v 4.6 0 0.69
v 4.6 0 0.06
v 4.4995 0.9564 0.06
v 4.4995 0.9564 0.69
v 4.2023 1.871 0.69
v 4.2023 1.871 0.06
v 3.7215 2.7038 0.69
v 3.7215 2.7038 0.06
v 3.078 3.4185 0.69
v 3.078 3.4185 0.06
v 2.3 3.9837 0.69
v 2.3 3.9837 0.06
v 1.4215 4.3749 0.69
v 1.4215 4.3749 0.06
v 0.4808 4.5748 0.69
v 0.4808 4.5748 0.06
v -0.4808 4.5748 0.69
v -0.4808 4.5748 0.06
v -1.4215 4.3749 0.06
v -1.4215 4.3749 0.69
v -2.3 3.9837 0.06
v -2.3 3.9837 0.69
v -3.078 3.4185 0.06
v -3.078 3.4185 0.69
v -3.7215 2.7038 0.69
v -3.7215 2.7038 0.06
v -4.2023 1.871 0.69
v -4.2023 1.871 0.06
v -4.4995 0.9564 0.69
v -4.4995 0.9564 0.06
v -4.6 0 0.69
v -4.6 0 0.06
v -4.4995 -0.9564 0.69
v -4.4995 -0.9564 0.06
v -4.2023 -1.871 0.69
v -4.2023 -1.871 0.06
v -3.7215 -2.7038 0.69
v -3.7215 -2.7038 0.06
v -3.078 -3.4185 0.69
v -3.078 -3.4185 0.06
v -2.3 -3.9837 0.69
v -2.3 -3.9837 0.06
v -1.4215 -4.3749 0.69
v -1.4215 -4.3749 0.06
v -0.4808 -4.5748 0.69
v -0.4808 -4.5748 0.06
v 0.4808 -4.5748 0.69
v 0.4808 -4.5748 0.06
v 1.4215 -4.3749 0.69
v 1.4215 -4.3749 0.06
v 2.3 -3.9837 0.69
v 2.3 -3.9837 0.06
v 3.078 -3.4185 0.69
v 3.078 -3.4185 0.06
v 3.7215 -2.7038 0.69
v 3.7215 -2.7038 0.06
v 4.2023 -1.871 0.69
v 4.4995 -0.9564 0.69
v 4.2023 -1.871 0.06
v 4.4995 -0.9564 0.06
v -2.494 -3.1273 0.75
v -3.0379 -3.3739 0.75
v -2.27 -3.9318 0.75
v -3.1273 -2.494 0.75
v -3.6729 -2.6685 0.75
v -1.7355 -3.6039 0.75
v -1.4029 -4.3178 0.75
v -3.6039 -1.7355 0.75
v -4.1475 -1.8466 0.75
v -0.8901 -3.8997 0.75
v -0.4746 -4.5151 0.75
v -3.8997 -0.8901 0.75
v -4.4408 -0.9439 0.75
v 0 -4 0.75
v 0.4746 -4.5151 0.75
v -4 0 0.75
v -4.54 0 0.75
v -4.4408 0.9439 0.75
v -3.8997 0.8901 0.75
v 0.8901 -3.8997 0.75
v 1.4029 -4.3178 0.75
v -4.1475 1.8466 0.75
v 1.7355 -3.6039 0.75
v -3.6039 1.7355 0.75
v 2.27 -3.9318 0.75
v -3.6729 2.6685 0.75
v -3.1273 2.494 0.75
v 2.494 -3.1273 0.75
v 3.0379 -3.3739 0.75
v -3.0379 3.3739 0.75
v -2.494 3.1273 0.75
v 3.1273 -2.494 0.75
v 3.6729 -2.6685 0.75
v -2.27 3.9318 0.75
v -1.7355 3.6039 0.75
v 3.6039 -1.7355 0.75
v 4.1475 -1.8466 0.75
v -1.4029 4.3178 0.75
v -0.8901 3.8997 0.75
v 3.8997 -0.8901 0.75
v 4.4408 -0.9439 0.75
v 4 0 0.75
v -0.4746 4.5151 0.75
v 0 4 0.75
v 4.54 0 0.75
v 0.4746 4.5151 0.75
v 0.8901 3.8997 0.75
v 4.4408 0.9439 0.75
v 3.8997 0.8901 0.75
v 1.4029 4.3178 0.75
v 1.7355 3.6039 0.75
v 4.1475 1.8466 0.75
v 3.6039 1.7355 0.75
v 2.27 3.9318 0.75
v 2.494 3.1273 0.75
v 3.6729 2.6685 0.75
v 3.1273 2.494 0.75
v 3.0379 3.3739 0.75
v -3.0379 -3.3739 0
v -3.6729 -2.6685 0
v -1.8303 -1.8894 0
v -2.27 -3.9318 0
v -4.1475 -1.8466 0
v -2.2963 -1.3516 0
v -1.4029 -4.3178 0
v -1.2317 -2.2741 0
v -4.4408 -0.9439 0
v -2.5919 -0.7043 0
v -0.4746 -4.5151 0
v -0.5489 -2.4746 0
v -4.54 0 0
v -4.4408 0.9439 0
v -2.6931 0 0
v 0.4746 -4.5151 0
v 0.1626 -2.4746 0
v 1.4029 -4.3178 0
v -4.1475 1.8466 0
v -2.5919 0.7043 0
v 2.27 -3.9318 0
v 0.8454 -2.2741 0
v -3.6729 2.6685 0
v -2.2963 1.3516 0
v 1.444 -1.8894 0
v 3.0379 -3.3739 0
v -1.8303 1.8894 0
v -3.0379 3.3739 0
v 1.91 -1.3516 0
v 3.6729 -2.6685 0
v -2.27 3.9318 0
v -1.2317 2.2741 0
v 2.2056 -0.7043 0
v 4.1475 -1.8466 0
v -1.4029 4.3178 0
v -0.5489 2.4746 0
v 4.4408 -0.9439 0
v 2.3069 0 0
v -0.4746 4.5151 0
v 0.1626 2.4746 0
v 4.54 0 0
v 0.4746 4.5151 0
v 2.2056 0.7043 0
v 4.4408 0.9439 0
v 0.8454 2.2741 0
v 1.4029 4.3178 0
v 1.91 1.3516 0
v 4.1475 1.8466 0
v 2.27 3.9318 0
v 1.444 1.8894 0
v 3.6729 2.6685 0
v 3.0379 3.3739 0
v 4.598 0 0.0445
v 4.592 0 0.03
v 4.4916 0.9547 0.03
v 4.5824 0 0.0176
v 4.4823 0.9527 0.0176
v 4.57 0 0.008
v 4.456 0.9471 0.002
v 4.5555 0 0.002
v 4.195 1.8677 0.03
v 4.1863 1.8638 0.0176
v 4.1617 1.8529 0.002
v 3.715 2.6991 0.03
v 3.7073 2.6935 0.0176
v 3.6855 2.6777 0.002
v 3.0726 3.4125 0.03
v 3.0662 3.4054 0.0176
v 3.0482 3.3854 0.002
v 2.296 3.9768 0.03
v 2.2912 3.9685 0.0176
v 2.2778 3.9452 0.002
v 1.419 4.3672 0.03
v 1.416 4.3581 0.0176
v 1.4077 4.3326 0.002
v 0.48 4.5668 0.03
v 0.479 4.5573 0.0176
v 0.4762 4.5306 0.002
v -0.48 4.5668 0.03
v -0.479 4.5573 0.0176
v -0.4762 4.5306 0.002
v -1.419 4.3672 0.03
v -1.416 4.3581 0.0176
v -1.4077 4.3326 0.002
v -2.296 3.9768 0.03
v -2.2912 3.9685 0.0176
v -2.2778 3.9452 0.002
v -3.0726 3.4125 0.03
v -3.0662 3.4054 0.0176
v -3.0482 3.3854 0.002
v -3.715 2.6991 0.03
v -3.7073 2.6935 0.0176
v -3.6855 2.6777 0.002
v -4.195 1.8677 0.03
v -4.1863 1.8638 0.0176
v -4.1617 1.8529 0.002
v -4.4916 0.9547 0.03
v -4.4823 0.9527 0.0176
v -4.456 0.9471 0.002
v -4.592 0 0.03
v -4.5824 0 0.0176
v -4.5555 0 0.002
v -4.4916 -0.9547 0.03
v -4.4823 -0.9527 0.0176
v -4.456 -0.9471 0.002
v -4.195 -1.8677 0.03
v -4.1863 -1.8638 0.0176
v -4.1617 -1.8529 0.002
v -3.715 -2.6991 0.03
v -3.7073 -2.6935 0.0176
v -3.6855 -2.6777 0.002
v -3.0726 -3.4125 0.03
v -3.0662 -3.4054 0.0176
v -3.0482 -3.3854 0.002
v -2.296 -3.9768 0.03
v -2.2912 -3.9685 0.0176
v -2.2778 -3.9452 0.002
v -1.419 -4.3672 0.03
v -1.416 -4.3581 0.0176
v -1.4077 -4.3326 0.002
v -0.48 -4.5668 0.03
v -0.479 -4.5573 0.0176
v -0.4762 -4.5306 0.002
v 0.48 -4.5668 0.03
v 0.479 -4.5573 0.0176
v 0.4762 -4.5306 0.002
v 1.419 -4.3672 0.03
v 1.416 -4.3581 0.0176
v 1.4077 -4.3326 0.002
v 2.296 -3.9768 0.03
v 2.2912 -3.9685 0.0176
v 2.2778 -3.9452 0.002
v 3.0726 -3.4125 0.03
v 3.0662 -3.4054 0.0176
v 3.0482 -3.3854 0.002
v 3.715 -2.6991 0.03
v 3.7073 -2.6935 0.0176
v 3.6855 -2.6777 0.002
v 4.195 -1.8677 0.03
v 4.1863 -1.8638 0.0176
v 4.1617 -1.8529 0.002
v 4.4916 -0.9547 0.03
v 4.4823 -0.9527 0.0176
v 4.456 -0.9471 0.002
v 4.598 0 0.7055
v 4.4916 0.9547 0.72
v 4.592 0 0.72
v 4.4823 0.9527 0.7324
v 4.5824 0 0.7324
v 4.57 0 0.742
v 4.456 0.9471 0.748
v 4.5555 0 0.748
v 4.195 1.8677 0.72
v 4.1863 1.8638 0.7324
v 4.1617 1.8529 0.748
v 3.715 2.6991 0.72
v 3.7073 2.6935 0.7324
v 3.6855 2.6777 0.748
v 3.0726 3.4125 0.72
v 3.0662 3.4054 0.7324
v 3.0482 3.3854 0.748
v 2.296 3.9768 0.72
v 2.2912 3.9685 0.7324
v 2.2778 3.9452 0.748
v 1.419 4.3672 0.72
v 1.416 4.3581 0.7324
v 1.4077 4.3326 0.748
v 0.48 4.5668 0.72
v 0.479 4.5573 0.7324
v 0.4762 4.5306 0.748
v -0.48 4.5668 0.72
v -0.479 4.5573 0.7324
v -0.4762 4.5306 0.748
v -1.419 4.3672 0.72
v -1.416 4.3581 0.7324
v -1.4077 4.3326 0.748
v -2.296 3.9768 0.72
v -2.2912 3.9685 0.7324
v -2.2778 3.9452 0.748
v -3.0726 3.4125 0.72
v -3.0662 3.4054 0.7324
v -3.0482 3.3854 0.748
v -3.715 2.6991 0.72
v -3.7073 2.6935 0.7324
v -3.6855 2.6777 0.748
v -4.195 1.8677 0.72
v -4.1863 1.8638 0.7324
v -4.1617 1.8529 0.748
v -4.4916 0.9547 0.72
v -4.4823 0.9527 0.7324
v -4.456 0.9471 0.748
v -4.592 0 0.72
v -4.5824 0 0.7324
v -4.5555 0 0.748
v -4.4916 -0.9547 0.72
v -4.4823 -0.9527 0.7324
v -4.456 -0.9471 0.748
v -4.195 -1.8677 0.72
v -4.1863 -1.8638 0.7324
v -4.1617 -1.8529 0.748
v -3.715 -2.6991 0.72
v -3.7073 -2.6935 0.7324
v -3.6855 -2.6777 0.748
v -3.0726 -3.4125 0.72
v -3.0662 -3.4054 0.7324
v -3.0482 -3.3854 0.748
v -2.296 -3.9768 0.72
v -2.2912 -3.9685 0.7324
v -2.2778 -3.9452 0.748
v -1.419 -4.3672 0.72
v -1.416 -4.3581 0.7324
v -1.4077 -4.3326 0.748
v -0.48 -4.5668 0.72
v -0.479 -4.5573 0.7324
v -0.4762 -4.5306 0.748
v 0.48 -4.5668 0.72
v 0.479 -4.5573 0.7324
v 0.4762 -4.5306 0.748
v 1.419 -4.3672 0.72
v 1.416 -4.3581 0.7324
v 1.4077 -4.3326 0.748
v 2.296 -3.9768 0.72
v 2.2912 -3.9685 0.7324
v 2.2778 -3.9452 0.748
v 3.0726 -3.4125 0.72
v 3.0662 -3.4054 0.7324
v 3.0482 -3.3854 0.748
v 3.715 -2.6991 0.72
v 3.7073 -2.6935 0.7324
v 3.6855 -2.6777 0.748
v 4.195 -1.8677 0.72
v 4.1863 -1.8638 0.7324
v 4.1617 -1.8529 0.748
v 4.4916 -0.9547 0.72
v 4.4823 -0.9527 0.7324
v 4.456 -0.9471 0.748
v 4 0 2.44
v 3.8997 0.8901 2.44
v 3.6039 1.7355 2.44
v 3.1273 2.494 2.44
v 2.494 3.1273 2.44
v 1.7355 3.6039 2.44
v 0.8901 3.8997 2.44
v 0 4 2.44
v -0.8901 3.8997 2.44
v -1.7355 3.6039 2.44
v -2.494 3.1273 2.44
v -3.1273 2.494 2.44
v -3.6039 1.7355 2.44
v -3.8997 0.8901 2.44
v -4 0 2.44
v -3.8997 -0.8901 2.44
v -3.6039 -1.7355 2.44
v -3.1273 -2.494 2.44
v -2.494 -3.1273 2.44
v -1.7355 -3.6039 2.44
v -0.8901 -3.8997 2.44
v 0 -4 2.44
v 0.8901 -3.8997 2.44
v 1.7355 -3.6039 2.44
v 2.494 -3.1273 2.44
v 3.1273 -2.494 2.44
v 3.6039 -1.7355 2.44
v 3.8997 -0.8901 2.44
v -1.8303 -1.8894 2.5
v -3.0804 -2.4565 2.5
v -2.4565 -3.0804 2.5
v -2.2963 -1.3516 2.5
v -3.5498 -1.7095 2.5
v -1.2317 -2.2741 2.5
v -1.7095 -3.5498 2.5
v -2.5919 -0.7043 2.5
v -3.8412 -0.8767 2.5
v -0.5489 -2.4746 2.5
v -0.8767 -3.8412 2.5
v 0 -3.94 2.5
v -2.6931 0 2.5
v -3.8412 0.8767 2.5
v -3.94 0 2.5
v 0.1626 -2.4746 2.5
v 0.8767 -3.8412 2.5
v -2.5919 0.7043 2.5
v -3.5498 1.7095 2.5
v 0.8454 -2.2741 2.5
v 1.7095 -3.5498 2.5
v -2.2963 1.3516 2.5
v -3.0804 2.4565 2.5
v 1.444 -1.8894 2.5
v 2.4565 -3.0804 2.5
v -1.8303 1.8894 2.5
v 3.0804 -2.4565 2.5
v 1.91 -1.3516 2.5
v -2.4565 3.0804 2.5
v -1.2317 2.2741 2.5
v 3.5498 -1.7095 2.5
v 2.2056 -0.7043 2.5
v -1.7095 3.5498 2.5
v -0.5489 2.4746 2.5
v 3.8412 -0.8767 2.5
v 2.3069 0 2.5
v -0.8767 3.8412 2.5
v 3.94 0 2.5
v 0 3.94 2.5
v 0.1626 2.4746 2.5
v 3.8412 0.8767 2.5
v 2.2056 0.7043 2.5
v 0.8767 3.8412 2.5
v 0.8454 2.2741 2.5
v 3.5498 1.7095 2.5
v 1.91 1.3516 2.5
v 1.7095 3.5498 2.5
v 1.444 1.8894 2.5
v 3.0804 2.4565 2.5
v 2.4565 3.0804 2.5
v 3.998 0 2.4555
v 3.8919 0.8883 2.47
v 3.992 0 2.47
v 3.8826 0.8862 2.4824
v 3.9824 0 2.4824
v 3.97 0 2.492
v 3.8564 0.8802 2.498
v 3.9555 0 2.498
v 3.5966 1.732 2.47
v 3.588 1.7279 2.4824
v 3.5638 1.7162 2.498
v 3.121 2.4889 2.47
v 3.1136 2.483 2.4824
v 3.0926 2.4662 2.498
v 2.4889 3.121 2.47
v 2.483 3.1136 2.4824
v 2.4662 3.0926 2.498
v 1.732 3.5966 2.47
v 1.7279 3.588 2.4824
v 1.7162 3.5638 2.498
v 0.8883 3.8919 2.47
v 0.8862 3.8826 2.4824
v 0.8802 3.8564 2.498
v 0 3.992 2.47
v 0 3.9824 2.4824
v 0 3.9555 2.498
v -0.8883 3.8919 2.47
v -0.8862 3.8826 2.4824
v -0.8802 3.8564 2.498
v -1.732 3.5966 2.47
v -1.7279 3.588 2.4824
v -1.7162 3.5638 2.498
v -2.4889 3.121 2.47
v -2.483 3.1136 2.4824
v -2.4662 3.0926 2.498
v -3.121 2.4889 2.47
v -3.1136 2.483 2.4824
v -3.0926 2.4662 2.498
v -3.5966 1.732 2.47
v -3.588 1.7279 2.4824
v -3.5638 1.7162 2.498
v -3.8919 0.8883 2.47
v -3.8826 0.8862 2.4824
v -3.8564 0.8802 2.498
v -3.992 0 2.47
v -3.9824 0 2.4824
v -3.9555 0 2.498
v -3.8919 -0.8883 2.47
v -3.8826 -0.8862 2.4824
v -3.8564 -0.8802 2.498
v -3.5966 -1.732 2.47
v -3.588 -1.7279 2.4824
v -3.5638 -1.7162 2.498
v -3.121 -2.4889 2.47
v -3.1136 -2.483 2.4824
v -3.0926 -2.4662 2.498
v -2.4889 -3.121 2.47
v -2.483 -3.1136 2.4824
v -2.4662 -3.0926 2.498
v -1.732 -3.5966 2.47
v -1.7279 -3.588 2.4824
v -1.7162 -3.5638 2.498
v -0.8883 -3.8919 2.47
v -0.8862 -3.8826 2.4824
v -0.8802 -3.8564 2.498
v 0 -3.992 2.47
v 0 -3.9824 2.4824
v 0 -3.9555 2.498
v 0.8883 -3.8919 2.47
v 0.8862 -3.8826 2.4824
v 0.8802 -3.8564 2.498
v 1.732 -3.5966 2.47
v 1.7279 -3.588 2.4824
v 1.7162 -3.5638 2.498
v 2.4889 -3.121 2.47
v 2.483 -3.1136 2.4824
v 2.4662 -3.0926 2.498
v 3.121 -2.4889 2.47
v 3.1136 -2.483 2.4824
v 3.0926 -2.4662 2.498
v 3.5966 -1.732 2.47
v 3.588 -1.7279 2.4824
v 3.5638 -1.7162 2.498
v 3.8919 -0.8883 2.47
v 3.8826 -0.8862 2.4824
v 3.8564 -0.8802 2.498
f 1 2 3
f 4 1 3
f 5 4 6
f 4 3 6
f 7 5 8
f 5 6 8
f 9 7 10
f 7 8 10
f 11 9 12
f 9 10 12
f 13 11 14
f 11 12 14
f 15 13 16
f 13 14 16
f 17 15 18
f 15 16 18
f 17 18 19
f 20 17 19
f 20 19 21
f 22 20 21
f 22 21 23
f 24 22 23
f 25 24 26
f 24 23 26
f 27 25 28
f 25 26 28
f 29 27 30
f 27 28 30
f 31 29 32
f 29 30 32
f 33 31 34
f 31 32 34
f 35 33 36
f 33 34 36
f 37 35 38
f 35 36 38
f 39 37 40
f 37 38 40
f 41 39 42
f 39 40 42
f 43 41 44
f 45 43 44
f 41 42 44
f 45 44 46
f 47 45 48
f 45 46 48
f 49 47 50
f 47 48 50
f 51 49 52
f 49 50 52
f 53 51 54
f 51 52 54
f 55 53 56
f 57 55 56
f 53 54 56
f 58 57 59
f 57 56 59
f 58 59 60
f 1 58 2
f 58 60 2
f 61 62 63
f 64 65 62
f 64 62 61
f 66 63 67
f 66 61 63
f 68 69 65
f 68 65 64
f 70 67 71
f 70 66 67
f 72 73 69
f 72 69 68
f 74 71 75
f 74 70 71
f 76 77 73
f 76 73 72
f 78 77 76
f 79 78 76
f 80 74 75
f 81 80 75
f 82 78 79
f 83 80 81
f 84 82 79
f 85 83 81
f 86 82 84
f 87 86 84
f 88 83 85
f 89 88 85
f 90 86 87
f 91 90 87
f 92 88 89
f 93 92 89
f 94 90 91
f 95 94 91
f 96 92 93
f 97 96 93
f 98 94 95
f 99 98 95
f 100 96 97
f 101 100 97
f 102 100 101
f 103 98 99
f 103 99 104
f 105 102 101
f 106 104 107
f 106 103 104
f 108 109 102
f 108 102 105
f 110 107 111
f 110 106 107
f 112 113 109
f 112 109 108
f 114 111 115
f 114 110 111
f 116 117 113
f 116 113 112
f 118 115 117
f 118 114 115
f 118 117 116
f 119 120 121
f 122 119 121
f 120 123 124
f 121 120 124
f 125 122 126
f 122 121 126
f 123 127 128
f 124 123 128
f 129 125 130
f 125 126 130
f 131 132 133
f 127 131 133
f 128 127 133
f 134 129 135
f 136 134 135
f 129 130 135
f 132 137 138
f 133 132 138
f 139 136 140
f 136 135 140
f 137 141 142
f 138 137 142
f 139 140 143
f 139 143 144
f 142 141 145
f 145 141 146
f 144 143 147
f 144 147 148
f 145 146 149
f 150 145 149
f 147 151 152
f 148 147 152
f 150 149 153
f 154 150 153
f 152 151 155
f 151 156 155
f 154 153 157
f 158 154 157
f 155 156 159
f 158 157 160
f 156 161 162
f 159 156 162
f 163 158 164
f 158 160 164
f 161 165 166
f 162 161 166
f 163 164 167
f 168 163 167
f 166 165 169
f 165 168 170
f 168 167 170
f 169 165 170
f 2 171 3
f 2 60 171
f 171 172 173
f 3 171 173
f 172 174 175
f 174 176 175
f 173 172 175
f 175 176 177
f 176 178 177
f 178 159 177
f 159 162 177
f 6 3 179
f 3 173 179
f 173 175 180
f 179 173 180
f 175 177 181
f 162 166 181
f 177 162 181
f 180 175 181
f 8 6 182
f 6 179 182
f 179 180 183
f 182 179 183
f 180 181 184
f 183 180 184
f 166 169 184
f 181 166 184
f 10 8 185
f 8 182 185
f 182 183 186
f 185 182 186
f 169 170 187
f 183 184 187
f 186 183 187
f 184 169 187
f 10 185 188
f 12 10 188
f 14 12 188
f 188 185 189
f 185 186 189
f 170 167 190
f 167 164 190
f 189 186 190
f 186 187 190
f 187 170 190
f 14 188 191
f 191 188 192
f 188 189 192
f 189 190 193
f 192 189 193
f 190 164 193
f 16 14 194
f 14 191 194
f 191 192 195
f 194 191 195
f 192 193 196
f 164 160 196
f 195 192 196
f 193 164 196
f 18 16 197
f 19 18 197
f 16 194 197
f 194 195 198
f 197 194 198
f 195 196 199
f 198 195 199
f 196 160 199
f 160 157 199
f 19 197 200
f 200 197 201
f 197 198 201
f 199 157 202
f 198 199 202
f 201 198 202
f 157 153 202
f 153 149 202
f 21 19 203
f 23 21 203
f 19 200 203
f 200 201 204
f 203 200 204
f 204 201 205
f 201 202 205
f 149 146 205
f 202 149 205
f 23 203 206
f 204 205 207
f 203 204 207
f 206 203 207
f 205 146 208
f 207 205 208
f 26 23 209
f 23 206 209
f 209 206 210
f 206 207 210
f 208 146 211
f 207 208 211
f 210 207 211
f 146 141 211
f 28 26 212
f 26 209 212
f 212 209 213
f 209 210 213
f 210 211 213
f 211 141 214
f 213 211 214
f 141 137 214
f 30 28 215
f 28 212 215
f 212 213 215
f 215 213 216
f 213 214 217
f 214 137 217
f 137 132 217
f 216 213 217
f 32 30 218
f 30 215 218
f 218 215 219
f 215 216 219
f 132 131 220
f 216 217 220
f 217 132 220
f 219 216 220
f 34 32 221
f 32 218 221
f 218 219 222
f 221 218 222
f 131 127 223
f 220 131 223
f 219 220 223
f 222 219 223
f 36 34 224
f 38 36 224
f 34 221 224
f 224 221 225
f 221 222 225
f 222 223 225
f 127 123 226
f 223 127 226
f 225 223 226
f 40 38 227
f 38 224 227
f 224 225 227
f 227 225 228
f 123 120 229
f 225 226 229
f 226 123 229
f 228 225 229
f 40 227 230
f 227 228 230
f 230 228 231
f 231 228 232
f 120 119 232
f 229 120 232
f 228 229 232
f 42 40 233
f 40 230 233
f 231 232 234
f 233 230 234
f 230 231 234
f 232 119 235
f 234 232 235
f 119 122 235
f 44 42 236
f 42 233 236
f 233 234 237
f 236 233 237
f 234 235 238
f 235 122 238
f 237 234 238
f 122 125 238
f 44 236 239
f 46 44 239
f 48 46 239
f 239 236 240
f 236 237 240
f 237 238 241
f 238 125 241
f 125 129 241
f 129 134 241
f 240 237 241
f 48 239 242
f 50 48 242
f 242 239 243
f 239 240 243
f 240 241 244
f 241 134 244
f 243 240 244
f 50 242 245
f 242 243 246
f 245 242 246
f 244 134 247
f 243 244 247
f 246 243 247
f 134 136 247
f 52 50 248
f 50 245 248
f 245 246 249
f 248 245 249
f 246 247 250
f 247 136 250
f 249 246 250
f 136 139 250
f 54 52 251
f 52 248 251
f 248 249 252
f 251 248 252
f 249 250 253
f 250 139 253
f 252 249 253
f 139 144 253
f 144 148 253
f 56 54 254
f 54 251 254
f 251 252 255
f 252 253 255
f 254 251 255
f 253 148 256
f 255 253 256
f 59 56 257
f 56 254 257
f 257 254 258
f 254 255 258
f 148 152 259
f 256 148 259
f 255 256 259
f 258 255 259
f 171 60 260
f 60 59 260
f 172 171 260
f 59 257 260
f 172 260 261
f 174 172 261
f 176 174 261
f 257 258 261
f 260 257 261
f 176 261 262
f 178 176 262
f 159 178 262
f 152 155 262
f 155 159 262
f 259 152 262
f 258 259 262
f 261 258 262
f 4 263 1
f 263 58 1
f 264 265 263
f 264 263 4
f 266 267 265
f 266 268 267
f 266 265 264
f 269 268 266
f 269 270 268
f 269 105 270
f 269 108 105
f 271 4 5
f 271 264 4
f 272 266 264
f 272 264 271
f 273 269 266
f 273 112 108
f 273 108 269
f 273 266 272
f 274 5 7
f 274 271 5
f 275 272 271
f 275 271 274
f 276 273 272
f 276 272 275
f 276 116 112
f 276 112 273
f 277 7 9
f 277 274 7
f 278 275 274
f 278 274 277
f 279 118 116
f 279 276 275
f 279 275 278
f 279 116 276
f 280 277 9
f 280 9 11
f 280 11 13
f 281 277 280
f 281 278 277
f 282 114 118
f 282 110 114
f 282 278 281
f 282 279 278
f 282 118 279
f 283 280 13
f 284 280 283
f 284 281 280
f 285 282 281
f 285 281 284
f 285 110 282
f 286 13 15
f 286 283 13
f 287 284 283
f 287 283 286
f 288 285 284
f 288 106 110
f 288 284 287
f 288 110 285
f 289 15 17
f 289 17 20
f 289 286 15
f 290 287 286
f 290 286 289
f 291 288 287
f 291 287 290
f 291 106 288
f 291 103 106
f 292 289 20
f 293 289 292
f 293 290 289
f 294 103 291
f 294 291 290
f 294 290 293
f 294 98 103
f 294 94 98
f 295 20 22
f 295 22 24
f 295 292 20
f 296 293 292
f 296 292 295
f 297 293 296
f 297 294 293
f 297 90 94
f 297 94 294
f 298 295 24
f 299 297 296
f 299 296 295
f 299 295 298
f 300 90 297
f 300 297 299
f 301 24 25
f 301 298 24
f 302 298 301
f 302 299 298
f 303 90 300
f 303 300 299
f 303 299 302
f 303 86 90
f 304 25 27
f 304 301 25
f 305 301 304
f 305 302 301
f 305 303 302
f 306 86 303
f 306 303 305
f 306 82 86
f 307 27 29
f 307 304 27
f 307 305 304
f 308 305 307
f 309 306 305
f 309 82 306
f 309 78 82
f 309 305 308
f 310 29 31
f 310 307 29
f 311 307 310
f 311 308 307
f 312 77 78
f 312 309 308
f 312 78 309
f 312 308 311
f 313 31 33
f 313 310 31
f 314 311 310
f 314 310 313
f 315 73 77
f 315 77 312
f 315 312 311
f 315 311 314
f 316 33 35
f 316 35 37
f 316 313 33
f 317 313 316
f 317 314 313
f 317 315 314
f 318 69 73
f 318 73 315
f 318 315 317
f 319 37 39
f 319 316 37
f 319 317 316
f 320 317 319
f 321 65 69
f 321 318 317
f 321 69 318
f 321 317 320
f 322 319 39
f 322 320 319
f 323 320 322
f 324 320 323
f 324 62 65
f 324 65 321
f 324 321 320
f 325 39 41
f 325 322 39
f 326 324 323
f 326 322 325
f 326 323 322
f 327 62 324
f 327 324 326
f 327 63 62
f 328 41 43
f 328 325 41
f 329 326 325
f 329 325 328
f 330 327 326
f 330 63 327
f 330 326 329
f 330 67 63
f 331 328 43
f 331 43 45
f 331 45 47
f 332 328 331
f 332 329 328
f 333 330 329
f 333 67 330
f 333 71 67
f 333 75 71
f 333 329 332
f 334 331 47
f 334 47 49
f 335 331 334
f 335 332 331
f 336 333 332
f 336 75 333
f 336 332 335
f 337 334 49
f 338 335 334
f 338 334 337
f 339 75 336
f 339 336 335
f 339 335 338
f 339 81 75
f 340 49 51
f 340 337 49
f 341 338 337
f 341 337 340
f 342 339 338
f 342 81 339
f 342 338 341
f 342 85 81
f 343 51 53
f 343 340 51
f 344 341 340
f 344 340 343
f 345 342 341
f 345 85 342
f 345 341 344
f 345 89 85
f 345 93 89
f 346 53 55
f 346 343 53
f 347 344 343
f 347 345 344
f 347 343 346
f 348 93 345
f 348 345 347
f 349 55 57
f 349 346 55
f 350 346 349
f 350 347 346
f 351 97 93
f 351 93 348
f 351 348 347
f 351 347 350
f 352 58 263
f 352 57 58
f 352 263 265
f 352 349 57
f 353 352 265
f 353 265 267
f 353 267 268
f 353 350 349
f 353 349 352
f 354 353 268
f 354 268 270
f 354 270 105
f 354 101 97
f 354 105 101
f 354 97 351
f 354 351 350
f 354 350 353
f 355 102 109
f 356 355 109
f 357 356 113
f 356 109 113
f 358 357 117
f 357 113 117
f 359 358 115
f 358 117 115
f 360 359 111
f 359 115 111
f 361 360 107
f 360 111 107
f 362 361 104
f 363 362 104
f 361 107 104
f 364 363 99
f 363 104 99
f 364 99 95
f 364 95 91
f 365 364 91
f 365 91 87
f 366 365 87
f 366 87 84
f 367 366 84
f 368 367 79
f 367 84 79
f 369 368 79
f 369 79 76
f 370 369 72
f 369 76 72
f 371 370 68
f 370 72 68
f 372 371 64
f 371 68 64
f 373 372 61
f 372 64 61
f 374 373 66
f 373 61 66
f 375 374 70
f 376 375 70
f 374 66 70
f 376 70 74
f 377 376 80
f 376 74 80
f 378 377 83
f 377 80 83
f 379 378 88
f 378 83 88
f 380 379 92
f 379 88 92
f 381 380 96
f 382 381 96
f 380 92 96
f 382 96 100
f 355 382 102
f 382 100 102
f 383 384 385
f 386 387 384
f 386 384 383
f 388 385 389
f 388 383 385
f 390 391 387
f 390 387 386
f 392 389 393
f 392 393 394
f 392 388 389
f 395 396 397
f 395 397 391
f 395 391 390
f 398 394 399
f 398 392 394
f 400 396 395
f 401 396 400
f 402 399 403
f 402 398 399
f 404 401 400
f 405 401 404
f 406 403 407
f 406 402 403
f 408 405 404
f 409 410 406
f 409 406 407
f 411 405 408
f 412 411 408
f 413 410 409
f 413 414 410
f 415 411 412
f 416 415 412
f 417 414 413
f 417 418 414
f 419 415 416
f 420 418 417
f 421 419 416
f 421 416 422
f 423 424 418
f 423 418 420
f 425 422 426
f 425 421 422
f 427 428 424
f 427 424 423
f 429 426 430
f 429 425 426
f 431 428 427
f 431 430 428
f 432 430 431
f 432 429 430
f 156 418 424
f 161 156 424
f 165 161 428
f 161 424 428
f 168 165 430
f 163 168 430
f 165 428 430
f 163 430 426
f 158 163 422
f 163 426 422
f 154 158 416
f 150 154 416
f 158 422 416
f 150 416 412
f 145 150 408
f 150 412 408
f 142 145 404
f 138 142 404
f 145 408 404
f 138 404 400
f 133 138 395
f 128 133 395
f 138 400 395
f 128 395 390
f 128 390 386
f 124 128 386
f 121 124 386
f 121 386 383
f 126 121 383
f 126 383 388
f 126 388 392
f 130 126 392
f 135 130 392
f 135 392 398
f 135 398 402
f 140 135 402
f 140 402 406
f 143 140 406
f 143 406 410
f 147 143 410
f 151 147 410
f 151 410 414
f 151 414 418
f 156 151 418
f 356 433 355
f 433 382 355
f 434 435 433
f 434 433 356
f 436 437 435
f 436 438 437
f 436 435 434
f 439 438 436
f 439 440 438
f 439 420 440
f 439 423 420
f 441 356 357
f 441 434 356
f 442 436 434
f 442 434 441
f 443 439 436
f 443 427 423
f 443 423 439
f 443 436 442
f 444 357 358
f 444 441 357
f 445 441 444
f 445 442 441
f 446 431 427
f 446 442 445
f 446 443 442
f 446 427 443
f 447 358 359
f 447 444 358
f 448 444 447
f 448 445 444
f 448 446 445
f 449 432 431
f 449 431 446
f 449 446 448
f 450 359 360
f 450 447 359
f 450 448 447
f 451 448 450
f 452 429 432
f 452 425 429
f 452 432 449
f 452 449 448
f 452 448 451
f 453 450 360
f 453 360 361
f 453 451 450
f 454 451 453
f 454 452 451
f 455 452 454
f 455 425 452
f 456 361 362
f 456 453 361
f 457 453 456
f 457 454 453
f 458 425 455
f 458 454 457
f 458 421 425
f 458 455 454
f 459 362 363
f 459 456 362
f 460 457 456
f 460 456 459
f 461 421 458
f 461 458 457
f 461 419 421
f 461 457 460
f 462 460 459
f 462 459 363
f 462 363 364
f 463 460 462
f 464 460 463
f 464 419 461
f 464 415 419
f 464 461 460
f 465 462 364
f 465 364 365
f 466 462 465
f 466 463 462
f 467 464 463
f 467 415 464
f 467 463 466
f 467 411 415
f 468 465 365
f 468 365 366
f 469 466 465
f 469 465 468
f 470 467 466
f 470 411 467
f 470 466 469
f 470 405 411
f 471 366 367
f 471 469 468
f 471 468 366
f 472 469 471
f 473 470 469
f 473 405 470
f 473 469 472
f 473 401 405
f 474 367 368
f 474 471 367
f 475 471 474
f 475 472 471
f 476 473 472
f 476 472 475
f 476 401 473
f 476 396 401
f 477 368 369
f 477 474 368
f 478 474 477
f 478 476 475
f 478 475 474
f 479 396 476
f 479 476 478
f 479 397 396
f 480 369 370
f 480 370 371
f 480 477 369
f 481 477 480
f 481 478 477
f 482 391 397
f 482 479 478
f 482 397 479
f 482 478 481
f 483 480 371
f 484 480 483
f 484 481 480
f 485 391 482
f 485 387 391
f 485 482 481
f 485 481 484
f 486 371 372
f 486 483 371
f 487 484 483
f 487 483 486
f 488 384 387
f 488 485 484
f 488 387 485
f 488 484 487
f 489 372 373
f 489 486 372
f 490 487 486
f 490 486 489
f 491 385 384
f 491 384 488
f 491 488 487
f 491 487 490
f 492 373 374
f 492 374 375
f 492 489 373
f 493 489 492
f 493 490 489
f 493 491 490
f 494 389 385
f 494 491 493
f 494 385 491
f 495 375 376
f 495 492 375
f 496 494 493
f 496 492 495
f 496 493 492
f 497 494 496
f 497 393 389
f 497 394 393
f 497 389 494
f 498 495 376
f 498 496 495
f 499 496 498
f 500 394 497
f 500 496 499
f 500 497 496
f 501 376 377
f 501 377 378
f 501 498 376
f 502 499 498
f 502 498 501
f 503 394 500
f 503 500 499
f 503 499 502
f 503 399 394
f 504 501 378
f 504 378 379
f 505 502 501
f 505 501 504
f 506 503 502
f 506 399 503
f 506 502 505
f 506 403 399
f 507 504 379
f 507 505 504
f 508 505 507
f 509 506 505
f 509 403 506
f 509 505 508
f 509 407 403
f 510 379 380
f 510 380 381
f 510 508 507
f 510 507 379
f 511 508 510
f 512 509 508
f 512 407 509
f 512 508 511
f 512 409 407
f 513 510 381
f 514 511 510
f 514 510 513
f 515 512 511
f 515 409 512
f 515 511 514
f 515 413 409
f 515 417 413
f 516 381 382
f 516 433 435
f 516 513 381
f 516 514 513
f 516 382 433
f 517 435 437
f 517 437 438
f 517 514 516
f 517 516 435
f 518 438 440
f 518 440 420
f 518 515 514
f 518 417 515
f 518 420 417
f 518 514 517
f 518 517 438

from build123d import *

# Parameters (mm, degrees)
SKETCH1_R           = 4.6
BOSS_EXTRUDE1_DEPTH = 0.75
SKETCH2_R           = 4
BOSS_EXTRUDE2_DEPTH = 1.75
SKETCH3_R           = 2.5
CUT_EXTRUDE1_DEPTH  = 3.5
FILLET1_R           = 0.06


with BuildPart() as part:
    # Sketch1 → Boss-Extrude1 (new body)
    with BuildSketch(Plane.XY):
        Circle(SKETCH1_R)
    extrude(amount=BOSS_EXTRUDE1_DEPTH)

    # Sketch2 → Boss-Extrude2 (add)
    with BuildSketch(Plane.XY.offset(0.75)):
        Circle(SKETCH2_R)
    extrude(amount=BOSS_EXTRUDE2_DEPTH)

    # Sketch3 → Cut-Extrude1 (cut, through all)
    with BuildSketch(Plane.XY.offset(2.5)):
        with Locations((-0.193142298, 0)):
            Circle(SKETCH3_R)
    extrude(amount=-CUT_EXTRUDE1_DEPTH, mode=Mode.SUBTRACT)

    # Fillet1
    fillet1_edges = [part.edges().sort_by_distance(p)[0] for p in [
        (-4.6, 0, 0),
        (-4.6, 0, 0.75),
        (-4, 0, 2.5),
    ]]
    fillet(fillet1_edges, radius=FILLET1_R)


solid = part.part
